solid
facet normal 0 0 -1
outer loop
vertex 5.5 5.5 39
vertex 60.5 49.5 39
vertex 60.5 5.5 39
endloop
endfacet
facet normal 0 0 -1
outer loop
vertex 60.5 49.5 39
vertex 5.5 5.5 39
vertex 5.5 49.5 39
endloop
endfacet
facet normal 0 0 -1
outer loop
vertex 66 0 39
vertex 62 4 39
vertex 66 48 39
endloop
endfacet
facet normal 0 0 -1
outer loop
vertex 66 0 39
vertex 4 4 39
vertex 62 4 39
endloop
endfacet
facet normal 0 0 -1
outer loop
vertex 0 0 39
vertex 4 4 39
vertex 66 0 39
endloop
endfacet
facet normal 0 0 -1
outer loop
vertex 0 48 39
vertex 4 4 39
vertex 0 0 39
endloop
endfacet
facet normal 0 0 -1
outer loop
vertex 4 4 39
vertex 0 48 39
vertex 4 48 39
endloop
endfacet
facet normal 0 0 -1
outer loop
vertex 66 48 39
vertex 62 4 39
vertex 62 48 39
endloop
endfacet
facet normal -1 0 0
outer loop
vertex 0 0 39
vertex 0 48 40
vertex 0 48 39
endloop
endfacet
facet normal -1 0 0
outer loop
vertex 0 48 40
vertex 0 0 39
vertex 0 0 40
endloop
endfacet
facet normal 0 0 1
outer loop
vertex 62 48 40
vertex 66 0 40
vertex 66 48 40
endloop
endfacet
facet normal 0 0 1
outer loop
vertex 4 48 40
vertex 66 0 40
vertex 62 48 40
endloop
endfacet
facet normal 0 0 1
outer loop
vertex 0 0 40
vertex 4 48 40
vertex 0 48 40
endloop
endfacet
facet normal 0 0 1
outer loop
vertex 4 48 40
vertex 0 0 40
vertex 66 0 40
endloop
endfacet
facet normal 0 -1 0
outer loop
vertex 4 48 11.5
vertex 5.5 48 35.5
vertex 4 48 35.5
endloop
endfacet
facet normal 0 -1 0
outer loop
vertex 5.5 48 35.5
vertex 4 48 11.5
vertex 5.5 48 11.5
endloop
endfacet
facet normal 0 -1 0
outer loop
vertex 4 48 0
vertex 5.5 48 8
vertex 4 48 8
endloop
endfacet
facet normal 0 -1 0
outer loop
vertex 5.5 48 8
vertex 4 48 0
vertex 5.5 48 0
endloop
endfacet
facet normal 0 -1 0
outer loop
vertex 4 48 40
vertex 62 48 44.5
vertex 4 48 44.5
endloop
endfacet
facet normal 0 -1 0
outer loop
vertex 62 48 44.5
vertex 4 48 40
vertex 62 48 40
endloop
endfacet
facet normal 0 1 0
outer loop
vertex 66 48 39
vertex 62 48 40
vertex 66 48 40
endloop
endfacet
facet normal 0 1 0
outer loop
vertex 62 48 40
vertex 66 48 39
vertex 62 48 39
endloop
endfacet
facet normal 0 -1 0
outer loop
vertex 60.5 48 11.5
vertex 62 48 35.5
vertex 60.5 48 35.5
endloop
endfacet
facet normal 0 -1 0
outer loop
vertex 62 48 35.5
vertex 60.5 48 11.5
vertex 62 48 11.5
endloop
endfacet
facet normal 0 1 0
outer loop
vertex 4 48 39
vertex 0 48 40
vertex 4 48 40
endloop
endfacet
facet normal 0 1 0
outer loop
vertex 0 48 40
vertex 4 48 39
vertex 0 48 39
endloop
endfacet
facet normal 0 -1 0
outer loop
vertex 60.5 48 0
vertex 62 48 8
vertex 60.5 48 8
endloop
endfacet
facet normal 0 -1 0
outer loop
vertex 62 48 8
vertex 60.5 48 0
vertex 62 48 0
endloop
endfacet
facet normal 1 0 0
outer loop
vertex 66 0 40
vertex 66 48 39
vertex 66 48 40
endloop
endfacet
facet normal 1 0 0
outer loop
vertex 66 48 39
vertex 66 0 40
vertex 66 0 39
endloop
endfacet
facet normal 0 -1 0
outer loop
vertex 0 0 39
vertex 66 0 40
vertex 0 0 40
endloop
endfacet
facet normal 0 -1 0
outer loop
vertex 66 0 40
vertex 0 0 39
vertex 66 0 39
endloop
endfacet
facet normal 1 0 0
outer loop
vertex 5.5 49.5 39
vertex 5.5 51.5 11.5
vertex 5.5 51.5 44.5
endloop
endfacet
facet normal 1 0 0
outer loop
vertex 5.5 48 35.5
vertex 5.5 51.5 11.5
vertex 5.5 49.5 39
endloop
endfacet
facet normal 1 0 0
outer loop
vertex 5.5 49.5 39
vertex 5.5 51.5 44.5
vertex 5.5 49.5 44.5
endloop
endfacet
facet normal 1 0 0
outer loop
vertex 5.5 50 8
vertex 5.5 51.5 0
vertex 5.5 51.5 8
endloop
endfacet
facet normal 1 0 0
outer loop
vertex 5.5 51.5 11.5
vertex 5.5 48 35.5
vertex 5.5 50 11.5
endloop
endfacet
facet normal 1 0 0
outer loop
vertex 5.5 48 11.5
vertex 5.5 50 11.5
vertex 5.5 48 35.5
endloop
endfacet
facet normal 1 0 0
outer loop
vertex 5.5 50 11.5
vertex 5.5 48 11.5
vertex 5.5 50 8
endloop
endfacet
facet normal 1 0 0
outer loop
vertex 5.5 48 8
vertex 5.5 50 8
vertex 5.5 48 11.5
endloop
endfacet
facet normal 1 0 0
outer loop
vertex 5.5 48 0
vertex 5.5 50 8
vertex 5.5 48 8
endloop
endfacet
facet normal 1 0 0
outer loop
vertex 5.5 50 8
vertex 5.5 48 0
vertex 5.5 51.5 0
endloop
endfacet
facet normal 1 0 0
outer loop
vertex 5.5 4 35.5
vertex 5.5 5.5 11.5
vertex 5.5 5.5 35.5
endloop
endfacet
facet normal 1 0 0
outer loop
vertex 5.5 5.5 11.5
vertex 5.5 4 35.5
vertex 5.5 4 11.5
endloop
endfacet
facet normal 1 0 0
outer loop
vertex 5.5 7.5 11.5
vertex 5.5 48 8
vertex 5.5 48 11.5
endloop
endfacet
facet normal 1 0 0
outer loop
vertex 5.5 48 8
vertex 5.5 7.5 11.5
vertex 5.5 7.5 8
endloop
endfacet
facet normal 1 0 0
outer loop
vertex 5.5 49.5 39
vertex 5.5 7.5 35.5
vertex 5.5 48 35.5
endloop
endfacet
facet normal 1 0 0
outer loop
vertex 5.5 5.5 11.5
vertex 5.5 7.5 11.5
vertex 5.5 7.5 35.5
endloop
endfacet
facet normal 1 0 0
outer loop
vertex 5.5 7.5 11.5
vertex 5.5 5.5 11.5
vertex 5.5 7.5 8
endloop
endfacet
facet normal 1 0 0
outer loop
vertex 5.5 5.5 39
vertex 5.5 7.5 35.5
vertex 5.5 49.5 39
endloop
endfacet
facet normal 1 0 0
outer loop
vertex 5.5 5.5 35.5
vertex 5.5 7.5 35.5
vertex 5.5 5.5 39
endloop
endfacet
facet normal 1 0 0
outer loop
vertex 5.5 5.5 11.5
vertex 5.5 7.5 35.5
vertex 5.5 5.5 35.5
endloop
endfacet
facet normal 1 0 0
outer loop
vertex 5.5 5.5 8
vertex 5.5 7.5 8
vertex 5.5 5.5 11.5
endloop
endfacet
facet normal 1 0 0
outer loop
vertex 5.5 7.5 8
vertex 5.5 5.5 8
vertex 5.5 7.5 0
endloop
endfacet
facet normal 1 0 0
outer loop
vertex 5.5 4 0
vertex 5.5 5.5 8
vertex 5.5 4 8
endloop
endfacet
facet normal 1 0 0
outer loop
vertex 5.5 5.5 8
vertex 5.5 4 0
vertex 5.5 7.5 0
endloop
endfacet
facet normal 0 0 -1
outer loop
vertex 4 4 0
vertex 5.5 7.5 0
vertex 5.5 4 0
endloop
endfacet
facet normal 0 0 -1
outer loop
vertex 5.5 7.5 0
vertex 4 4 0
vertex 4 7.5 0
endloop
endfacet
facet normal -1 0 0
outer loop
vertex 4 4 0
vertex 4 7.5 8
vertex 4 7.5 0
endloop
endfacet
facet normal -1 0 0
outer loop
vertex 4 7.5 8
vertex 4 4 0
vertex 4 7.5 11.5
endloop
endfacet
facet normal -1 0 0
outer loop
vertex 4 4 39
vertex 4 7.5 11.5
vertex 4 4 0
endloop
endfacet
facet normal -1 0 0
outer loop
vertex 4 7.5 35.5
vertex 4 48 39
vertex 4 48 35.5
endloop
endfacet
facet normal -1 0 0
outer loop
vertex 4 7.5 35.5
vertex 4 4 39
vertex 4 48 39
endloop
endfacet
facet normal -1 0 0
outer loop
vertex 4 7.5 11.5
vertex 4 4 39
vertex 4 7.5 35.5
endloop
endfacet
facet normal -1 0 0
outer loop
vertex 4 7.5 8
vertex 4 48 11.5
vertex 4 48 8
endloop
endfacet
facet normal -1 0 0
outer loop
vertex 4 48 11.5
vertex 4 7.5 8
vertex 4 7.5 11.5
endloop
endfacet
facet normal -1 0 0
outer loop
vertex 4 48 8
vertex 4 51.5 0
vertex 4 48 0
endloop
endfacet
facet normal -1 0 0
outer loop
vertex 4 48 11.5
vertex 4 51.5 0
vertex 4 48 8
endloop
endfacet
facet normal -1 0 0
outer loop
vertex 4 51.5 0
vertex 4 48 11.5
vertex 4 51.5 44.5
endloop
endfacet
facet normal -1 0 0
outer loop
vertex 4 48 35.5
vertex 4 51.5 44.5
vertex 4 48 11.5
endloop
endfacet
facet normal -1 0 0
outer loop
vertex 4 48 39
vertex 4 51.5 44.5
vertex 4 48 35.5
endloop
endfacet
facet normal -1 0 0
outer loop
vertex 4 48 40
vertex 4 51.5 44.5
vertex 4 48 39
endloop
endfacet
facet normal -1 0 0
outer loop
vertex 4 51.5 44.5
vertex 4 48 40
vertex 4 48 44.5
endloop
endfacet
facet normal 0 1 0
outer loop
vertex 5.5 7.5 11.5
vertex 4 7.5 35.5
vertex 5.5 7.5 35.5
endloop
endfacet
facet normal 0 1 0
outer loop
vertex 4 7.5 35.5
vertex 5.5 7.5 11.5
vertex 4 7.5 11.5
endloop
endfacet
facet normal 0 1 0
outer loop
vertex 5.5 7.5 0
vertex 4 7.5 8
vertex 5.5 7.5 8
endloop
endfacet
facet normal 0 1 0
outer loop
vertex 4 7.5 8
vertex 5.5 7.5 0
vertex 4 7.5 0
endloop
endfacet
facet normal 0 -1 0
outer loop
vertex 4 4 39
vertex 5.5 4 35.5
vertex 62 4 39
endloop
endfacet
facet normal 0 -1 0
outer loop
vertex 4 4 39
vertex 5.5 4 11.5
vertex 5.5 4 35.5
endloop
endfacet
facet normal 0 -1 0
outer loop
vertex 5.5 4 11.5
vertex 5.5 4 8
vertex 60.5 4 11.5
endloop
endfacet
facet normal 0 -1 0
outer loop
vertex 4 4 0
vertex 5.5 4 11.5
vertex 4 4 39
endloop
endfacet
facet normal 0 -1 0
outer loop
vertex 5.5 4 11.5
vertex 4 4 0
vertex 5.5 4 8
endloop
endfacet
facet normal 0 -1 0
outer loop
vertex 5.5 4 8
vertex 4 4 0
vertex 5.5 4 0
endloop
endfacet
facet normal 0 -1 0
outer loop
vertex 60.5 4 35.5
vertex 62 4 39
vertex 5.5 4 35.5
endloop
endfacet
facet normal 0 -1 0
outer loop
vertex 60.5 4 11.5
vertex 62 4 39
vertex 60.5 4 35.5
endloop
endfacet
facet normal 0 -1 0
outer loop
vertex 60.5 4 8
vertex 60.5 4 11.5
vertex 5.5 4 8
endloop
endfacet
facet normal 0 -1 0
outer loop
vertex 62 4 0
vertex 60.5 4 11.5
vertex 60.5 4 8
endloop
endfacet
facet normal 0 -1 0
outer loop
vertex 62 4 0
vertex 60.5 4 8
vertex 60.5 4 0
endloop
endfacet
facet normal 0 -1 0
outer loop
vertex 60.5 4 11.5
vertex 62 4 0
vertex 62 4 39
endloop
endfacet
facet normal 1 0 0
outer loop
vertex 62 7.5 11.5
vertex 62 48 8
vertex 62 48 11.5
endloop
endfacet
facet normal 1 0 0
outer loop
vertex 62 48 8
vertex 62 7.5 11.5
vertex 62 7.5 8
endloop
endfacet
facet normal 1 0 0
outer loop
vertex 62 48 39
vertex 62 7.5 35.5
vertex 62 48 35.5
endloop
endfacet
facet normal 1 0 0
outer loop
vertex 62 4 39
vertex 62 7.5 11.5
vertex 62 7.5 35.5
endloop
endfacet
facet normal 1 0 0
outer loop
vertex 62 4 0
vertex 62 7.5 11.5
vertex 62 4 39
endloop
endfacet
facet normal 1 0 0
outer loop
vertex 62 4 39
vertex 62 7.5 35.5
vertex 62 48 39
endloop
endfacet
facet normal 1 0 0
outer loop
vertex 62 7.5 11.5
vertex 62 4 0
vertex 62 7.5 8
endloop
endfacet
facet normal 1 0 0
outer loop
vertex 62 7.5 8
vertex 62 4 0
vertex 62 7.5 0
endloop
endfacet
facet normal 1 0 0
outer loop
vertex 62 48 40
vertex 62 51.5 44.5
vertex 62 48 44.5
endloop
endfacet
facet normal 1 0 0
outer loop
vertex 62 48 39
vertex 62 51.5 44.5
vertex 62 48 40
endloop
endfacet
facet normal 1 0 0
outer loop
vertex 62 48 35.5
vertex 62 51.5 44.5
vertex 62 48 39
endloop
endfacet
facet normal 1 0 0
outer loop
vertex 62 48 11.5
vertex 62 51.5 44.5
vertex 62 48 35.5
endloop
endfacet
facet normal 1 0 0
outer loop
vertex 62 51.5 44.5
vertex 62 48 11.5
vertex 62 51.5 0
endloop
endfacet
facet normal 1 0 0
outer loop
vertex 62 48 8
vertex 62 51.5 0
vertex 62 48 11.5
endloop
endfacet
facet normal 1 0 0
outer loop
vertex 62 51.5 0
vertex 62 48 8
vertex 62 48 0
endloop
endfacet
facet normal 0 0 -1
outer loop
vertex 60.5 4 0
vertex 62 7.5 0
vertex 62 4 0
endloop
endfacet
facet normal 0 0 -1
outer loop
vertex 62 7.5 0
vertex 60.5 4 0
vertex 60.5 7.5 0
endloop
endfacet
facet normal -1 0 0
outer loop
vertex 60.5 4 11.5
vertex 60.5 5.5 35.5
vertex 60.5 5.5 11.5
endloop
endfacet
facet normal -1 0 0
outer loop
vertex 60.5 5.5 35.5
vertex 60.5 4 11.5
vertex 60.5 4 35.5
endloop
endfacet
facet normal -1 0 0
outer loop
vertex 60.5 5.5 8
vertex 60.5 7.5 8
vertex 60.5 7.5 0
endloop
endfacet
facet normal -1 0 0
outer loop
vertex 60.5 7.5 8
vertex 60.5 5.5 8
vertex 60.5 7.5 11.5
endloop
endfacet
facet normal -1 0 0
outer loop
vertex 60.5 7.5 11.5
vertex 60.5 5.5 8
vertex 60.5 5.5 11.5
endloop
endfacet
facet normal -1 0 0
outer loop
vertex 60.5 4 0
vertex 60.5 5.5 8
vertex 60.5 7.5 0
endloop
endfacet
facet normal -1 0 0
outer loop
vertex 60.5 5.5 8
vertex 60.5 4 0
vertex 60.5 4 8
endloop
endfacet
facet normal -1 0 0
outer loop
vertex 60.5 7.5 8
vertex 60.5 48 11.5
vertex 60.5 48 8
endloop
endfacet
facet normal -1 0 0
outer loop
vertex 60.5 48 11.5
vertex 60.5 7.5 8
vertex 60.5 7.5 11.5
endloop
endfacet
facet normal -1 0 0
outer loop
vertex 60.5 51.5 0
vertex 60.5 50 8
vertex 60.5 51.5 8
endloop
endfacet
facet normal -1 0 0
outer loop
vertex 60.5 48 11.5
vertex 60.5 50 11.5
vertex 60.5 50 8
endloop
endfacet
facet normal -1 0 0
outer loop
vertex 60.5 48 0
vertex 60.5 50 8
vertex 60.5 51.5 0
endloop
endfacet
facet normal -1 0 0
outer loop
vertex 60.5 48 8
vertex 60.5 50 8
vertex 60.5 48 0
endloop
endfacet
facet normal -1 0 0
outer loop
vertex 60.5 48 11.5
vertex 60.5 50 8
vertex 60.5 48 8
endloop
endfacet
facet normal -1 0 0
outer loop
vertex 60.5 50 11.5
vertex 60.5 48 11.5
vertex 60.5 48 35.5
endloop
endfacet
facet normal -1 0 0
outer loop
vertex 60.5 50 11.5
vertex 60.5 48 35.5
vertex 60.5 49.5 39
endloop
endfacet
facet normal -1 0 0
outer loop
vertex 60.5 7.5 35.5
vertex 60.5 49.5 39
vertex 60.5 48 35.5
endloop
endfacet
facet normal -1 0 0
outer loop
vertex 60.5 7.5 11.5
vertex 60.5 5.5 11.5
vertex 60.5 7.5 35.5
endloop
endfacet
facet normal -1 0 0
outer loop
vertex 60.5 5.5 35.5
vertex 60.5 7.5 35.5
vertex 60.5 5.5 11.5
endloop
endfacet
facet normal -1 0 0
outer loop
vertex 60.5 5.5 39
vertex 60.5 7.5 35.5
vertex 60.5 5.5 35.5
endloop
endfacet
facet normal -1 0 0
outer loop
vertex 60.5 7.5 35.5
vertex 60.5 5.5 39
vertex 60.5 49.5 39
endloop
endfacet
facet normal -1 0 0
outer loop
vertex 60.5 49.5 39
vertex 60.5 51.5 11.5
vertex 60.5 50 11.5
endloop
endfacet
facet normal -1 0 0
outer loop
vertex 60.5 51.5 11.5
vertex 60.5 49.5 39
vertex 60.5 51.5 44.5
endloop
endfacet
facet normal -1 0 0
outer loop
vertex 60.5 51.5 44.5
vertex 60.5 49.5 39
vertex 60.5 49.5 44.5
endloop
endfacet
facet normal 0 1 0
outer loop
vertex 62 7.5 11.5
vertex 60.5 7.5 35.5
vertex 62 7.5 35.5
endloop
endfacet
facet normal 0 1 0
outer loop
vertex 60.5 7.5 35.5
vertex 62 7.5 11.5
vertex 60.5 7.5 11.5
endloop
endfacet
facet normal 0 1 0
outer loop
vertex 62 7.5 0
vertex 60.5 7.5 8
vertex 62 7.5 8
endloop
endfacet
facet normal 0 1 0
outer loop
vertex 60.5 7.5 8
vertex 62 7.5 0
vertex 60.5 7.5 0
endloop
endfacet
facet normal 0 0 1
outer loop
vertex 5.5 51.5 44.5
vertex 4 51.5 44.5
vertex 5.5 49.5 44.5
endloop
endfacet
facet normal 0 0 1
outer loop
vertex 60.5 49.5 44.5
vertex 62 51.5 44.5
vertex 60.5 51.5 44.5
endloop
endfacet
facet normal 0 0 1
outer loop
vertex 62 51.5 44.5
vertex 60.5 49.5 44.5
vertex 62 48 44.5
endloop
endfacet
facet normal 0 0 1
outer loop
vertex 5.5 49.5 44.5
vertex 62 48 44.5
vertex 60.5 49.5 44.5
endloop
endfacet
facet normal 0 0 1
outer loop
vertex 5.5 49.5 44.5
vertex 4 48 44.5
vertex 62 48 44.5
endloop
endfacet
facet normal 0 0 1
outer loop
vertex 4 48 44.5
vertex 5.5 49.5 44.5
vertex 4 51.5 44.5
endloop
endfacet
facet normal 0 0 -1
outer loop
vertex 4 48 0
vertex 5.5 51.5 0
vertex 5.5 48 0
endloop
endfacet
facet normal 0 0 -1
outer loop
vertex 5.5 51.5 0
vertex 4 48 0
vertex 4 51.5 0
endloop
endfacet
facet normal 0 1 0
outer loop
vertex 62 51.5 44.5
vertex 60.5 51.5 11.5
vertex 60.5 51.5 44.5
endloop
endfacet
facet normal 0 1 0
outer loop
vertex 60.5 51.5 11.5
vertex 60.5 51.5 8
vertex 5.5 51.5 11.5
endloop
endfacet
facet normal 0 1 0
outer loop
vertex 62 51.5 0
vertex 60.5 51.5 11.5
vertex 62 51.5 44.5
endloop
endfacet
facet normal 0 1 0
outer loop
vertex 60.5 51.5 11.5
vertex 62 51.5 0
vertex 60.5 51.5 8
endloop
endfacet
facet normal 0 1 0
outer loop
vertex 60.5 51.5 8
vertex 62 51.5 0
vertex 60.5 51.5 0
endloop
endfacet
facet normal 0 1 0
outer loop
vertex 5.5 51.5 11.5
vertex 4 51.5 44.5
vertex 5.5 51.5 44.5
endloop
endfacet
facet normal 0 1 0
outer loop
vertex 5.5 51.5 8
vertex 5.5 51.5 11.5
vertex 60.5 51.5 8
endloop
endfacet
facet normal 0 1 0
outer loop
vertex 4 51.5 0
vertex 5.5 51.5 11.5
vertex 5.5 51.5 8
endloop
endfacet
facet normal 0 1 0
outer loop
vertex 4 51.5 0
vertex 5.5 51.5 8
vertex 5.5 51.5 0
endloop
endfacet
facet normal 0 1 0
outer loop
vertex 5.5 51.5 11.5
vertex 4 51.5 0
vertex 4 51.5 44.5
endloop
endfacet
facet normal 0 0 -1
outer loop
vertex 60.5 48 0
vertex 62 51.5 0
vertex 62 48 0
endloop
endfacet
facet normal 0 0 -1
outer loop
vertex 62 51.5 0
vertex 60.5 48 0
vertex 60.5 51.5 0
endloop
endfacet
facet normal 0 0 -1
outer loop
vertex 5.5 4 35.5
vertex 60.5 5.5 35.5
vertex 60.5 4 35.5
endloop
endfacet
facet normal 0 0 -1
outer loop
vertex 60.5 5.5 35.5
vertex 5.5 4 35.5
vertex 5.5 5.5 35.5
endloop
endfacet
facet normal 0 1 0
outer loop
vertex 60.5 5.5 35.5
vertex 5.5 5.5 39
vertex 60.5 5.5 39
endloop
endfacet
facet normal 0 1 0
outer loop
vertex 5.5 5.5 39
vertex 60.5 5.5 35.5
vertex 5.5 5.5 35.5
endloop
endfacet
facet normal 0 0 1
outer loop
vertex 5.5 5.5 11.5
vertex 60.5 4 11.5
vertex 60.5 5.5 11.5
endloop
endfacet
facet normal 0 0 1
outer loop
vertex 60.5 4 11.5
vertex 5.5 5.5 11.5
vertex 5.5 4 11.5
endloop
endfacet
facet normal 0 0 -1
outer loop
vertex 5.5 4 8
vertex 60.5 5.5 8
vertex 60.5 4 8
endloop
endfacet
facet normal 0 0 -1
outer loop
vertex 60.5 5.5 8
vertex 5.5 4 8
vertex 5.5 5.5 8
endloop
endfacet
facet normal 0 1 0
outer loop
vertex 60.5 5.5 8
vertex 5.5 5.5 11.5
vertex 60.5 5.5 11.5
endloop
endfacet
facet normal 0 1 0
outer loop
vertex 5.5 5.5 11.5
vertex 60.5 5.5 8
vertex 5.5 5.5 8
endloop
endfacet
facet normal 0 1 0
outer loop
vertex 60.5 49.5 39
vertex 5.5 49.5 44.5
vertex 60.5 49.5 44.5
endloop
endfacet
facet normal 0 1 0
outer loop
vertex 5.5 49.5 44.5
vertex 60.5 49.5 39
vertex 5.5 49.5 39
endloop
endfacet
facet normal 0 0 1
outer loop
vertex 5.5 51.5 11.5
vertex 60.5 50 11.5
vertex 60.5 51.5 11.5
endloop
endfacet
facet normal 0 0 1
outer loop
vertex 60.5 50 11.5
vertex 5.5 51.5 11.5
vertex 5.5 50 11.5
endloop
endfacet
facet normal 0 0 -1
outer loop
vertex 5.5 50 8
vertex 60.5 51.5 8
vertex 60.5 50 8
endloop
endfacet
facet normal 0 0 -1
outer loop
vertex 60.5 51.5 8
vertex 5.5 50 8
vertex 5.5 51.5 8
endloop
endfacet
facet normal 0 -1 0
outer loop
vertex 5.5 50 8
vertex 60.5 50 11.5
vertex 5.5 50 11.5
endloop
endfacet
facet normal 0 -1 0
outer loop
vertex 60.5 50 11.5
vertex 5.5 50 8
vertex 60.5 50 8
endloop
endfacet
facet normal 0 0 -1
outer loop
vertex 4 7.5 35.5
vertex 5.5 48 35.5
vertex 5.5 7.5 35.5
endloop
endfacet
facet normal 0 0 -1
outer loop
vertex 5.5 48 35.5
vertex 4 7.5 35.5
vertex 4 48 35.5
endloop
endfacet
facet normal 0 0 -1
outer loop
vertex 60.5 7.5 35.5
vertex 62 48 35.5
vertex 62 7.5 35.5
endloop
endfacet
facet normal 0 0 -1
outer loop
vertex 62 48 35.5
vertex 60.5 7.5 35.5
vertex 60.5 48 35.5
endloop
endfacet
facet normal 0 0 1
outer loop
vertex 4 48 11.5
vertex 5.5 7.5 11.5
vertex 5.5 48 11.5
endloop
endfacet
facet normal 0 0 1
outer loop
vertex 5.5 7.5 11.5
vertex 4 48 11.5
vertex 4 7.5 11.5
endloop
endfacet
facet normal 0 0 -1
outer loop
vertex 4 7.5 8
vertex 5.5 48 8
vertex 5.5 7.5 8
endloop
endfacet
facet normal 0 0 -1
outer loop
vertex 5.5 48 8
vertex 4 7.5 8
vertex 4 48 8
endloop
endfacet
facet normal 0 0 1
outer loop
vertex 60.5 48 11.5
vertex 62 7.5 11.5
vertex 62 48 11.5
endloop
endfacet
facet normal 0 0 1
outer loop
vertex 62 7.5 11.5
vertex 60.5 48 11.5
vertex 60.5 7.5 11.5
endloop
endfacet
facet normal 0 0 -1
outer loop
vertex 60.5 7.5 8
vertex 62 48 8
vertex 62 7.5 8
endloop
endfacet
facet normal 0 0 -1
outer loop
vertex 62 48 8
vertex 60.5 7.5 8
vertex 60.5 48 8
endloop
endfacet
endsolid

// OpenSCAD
// Workbench

// Define some basics
// working in Imperial for this. Measurements are in inches. Le sigh.

Twox4W = 3.5;
Twox4H = 1.5;

Twox6W = 5.5;
Twox6H = 1.5;

HorizontalOffset = 4.0;

WorkSurfaceW = 48;
WorkSurfaceL = 66;
WorkSurfaceH = 1;

RailLongLength = (WorkSurfaceL - ( 2 * Twox4H ) - ( 2 * HorizontalOffset ));
RailShortLength = (WorkSurfaceW - ( 1 * Twox4W ) - ( 1 * HorizontalOffset ));

PostShortLength = (40 - WorkSurfaceH);
PostLongLength = (40 + Twox6W - WorkSurfaceH);

BottomRailLowerHeight = 8;

echo("Cuts:");
echo("1 x Rail Long Length (2x6) = ", RailLongLength);
echo("3 x Rail Long Length (2x4) = ", RailLongLength);
echo("4 x Rail Short Length (2x4) = ", RailShortLength);
echo("");
echo("2 x Post Long Length (2x4) = ", PostLongLength);
echo("2 x Post Short Length (2x4) = ", PostShortLength);

// simple 2D -> 3D extrusion of a rectangle
// work surface
color("white")
    translate([0, 0, PostShortLength])
        linear_extrude(height = WorkSurfaceH)
            square([WorkSurfaceL, WorkSurfaceW], center = false);

// posts
// front left
color("red")
    translate([HorizontalOffset, HorizontalOffset, 0])
        scale([Twox4H, Twox4W, PostShortLength])
            cube(1, center = false);

// front right
color("red")
    translate([Twox4H + RailLongLength + HorizontalOffset, HorizontalOffset, 0])
        scale([Twox4H, Twox4W, PostShortLength])
            cube(1, center = false);

// back left
color("red")
    translate([HorizontalOffset, Twox4W + RailShortLength + 
HorizontalOffset, 0])
        scale([Twox4H, Twox4W, PostLongLength])
            cube(1, center = false);

// back right
color("red")
    translate([Twox4H + RailLongLength + HorizontalOffset, Twox4W + RailShortLength + 
HorizontalOffset, 0])
        scale([Twox4H, Twox4W, PostLongLength])
            cube(1, center = false);

// rails
// upper front
color("blue")
    translate([Twox4H + HorizontalOffset, HorizontalOffset, PostShortLength - Twox4W])
        scale([RailLongLength, Twox4H, Twox4W])
            cube(1, center = false);

// lower front
color("green")
    translate([Twox4H + HorizontalOffset, HorizontalOffset, BottomRailLowerHeight])
        scale([RailLongLength, Twox4H, Twox4W])
            cube(1, center = false);

// upper back
color("gold")
    translate([Twox4H + HorizontalOffset, WorkSurfaceW, PostShortLength])
        scale([RailLongLength, Twox6H, Twox6W])
            cube(1, center = false);

// lower back
color("green")
    translate([Twox4H + HorizontalOffset, WorkSurfaceW + Twox4W - Twox4H, BottomRailLowerHeight])
        scale([RailLongLength, Twox4H, Twox4W])
            cube(1, center = false);

// upper left
color("yellow")
    translate([HorizontalOffset, Twox4W + HorizontalOffset, PostShortLength - Twox4W])
        scale([Twox4H, RailShortLength, Twox4W])
            cube(1, center = false);

// upper right
color("yellow")
    translate([Twox4H + RailLongLength + HorizontalOffset,  Twox4W + HorizontalOffset, PostShortLength - Twox4W])
        scale([Twox4H, RailShortLength, Twox4W])
            cube(1, center = false);

// lower left
color("yellow")
    translate([HorizontalOffset, Twox4W + HorizontalOffset, BottomRailLowerHeight])
        scale([Twox4H, RailShortLength, Twox4W])
            cube(1, center = false);

// lower right
color("yellow")
    translate([Twox4H + RailLongLength + HorizontalOffset,  Twox4W + HorizontalOffset, BottomRailLowerHeight])
        scale([Twox4H, RailShortLength, Twox4W])
            cube(1, center = false);
